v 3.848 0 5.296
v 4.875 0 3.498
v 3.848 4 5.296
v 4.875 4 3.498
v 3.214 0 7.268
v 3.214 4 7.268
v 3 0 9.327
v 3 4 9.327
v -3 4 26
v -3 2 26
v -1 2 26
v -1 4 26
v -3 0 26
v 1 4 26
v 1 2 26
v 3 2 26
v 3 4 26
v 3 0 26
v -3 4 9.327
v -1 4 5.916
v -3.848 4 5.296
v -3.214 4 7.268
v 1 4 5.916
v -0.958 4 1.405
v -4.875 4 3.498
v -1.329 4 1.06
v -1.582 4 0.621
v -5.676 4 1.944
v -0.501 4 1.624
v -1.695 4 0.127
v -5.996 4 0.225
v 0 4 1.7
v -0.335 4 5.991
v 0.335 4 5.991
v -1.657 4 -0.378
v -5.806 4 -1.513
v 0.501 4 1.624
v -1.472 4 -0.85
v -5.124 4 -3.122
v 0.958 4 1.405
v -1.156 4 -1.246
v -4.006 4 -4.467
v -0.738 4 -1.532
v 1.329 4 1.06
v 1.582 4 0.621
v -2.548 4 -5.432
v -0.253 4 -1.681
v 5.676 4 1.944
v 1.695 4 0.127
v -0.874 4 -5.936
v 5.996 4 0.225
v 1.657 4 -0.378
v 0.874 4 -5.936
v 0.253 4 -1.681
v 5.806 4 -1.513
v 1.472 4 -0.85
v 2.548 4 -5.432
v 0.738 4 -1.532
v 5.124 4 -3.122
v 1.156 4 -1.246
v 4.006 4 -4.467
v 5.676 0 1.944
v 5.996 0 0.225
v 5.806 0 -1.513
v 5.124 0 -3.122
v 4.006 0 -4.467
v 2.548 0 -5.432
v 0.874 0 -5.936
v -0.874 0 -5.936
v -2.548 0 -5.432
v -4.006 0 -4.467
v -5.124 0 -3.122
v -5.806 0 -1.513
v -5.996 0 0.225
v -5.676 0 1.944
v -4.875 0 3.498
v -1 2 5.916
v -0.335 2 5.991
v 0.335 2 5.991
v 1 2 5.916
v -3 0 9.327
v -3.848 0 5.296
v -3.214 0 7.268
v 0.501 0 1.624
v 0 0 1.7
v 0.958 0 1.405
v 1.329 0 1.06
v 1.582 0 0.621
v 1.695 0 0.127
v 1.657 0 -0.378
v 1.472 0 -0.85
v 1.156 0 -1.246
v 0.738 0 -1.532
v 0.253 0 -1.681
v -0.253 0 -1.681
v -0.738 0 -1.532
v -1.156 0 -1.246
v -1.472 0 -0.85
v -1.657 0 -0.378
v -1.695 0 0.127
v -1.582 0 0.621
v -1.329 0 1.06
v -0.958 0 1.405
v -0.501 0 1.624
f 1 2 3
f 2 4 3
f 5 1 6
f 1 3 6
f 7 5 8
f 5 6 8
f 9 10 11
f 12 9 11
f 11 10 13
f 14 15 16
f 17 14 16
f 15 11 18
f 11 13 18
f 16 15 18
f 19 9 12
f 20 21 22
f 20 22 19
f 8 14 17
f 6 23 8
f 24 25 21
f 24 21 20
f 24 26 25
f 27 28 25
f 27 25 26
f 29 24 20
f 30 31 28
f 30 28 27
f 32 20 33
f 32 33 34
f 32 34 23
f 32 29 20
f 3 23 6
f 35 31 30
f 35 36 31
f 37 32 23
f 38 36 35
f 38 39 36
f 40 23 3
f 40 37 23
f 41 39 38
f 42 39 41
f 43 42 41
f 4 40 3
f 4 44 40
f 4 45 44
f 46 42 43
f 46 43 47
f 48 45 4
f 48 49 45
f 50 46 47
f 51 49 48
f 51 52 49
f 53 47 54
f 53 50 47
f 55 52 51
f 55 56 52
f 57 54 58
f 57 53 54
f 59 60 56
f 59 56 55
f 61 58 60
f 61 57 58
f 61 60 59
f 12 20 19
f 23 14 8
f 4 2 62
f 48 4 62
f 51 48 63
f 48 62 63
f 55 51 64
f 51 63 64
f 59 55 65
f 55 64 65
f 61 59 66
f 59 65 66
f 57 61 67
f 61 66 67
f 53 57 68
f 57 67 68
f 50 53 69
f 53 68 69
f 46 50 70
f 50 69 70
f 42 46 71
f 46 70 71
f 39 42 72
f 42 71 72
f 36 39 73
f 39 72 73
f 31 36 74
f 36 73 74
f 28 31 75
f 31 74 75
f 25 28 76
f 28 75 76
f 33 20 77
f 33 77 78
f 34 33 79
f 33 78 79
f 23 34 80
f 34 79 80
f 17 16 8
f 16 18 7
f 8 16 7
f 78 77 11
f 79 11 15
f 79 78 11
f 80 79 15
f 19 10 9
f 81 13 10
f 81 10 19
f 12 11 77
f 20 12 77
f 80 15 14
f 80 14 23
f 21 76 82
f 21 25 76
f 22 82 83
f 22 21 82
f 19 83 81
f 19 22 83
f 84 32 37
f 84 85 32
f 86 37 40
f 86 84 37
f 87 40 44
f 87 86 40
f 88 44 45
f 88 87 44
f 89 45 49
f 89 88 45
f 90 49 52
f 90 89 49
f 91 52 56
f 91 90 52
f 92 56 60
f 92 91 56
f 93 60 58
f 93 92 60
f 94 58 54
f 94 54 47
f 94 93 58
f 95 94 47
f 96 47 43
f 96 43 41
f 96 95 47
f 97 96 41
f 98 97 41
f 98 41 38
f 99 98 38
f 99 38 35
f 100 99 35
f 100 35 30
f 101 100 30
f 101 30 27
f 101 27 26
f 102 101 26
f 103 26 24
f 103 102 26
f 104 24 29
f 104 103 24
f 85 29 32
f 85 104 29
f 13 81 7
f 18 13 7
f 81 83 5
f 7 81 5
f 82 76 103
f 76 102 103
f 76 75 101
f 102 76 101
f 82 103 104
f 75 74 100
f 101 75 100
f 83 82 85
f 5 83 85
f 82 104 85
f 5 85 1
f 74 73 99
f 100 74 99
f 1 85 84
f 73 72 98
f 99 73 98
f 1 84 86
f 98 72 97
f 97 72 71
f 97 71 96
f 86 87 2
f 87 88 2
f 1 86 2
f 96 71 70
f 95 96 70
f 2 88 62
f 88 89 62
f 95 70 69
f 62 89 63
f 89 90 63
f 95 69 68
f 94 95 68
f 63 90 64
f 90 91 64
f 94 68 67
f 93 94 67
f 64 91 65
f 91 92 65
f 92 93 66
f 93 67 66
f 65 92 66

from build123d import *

# Parameters (mm, degrees)
SKETCH1_R           = 6
SKETCH1_R_2         = 1.7
BOSS_EXTRUDE1_DEPTH = 2
SKETCH2_W           = 2
SKETCH2_H           = 20.803847577
BOSS_EXTRUDE2_DEPTH = 2
SKETCH3_R           = 6
SKETCH3_R_2         = 1.7
BOSS_EXTRUDE3_DEPTH = 2
FILLET1_R           = 10


with BuildPart() as part:
    # Sketch1 → Boss-Extrude1 (new body)
    # profile 1 of 3: a face of its own
    with BuildSketch(Plane(origin=(0, 0, 0), x_dir=(1, 0, 0), z_dir=(0, 1, 0))):
        Circle(SKETCH1_R)
        with Locations(Location((0, 0, 0), (0, 0, 270))):
            Circle(SKETCH1_R_2, mode=Mode.SUBTRACT)
    # profile 2 of 3: a face of its own
    with BuildSketch(Plane(origin=(0, 0, 0), x_dir=(1, 0, 0), z_dir=(0, 1, 0))):
        with BuildLine():
            ThreePointArc((3, -5.196152423), (1.552914271, -5.795554958), (0, -6))
            Line((0, -6), (0, -26))
            Line((0, -26), (3, -26))
            Line((3, -26), (3, -5.196152423))
        make_face()
    # profile 3 of 3: a face of its own
    with BuildSketch(Plane(origin=(0, 0, 0), x_dir=(1, 0, 0), z_dir=(0, 1, 0))):
        with BuildLine():
            Line((0, -26), (0, -6))
            ThreePointArc((0, -6), (-1.552914271, -5.795554958), (-3, -5.196152423))
            Line((-3, -5.196152423), (-3, -26))
            Line((-3, -26), (0, -26))
        make_face()
    extrude(amount=BOSS_EXTRUDE1_DEPTH)

    # Sketch2 → Boss-Extrude2 (add)
    with BuildSketch(Plane(origin=(0, 2, 0), x_dir=(1, 0, 0), z_dir=(0, 1, 0))):
        with Locations((-2, -15.598076212)):
            Rectangle(SKETCH2_W, SKETCH2_H)
        with Locations((2, -15.598076212)):
            Rectangle(SKETCH2_W, SKETCH2_H)
    extrude(amount=BOSS_EXTRUDE2_DEPTH)

    # Sketch3 → Boss-Extrude3 (add)
    with BuildSketch(Plane(origin=(0, 2, 0), x_dir=(1, 0, 0), z_dir=(0, 1, 0))):
        Circle(SKETCH3_R)
        with Locations(Location((0, 0, 0), (0, 0, 270))):
            Circle(SKETCH3_R_2, mode=Mode.SUBTRACT)
    extrude(amount=BOSS_EXTRUDE3_DEPTH)

    # Fillet1
    fillet1_edges = [part.edges().sort_by_distance(p)[0] for p in [
        (-3, 2, 5.196152423),
        (3, 2, 5.196152423),
    ]]
    fillet(fillet1_edges, radius=FILLET1_R)


solid = part.part
